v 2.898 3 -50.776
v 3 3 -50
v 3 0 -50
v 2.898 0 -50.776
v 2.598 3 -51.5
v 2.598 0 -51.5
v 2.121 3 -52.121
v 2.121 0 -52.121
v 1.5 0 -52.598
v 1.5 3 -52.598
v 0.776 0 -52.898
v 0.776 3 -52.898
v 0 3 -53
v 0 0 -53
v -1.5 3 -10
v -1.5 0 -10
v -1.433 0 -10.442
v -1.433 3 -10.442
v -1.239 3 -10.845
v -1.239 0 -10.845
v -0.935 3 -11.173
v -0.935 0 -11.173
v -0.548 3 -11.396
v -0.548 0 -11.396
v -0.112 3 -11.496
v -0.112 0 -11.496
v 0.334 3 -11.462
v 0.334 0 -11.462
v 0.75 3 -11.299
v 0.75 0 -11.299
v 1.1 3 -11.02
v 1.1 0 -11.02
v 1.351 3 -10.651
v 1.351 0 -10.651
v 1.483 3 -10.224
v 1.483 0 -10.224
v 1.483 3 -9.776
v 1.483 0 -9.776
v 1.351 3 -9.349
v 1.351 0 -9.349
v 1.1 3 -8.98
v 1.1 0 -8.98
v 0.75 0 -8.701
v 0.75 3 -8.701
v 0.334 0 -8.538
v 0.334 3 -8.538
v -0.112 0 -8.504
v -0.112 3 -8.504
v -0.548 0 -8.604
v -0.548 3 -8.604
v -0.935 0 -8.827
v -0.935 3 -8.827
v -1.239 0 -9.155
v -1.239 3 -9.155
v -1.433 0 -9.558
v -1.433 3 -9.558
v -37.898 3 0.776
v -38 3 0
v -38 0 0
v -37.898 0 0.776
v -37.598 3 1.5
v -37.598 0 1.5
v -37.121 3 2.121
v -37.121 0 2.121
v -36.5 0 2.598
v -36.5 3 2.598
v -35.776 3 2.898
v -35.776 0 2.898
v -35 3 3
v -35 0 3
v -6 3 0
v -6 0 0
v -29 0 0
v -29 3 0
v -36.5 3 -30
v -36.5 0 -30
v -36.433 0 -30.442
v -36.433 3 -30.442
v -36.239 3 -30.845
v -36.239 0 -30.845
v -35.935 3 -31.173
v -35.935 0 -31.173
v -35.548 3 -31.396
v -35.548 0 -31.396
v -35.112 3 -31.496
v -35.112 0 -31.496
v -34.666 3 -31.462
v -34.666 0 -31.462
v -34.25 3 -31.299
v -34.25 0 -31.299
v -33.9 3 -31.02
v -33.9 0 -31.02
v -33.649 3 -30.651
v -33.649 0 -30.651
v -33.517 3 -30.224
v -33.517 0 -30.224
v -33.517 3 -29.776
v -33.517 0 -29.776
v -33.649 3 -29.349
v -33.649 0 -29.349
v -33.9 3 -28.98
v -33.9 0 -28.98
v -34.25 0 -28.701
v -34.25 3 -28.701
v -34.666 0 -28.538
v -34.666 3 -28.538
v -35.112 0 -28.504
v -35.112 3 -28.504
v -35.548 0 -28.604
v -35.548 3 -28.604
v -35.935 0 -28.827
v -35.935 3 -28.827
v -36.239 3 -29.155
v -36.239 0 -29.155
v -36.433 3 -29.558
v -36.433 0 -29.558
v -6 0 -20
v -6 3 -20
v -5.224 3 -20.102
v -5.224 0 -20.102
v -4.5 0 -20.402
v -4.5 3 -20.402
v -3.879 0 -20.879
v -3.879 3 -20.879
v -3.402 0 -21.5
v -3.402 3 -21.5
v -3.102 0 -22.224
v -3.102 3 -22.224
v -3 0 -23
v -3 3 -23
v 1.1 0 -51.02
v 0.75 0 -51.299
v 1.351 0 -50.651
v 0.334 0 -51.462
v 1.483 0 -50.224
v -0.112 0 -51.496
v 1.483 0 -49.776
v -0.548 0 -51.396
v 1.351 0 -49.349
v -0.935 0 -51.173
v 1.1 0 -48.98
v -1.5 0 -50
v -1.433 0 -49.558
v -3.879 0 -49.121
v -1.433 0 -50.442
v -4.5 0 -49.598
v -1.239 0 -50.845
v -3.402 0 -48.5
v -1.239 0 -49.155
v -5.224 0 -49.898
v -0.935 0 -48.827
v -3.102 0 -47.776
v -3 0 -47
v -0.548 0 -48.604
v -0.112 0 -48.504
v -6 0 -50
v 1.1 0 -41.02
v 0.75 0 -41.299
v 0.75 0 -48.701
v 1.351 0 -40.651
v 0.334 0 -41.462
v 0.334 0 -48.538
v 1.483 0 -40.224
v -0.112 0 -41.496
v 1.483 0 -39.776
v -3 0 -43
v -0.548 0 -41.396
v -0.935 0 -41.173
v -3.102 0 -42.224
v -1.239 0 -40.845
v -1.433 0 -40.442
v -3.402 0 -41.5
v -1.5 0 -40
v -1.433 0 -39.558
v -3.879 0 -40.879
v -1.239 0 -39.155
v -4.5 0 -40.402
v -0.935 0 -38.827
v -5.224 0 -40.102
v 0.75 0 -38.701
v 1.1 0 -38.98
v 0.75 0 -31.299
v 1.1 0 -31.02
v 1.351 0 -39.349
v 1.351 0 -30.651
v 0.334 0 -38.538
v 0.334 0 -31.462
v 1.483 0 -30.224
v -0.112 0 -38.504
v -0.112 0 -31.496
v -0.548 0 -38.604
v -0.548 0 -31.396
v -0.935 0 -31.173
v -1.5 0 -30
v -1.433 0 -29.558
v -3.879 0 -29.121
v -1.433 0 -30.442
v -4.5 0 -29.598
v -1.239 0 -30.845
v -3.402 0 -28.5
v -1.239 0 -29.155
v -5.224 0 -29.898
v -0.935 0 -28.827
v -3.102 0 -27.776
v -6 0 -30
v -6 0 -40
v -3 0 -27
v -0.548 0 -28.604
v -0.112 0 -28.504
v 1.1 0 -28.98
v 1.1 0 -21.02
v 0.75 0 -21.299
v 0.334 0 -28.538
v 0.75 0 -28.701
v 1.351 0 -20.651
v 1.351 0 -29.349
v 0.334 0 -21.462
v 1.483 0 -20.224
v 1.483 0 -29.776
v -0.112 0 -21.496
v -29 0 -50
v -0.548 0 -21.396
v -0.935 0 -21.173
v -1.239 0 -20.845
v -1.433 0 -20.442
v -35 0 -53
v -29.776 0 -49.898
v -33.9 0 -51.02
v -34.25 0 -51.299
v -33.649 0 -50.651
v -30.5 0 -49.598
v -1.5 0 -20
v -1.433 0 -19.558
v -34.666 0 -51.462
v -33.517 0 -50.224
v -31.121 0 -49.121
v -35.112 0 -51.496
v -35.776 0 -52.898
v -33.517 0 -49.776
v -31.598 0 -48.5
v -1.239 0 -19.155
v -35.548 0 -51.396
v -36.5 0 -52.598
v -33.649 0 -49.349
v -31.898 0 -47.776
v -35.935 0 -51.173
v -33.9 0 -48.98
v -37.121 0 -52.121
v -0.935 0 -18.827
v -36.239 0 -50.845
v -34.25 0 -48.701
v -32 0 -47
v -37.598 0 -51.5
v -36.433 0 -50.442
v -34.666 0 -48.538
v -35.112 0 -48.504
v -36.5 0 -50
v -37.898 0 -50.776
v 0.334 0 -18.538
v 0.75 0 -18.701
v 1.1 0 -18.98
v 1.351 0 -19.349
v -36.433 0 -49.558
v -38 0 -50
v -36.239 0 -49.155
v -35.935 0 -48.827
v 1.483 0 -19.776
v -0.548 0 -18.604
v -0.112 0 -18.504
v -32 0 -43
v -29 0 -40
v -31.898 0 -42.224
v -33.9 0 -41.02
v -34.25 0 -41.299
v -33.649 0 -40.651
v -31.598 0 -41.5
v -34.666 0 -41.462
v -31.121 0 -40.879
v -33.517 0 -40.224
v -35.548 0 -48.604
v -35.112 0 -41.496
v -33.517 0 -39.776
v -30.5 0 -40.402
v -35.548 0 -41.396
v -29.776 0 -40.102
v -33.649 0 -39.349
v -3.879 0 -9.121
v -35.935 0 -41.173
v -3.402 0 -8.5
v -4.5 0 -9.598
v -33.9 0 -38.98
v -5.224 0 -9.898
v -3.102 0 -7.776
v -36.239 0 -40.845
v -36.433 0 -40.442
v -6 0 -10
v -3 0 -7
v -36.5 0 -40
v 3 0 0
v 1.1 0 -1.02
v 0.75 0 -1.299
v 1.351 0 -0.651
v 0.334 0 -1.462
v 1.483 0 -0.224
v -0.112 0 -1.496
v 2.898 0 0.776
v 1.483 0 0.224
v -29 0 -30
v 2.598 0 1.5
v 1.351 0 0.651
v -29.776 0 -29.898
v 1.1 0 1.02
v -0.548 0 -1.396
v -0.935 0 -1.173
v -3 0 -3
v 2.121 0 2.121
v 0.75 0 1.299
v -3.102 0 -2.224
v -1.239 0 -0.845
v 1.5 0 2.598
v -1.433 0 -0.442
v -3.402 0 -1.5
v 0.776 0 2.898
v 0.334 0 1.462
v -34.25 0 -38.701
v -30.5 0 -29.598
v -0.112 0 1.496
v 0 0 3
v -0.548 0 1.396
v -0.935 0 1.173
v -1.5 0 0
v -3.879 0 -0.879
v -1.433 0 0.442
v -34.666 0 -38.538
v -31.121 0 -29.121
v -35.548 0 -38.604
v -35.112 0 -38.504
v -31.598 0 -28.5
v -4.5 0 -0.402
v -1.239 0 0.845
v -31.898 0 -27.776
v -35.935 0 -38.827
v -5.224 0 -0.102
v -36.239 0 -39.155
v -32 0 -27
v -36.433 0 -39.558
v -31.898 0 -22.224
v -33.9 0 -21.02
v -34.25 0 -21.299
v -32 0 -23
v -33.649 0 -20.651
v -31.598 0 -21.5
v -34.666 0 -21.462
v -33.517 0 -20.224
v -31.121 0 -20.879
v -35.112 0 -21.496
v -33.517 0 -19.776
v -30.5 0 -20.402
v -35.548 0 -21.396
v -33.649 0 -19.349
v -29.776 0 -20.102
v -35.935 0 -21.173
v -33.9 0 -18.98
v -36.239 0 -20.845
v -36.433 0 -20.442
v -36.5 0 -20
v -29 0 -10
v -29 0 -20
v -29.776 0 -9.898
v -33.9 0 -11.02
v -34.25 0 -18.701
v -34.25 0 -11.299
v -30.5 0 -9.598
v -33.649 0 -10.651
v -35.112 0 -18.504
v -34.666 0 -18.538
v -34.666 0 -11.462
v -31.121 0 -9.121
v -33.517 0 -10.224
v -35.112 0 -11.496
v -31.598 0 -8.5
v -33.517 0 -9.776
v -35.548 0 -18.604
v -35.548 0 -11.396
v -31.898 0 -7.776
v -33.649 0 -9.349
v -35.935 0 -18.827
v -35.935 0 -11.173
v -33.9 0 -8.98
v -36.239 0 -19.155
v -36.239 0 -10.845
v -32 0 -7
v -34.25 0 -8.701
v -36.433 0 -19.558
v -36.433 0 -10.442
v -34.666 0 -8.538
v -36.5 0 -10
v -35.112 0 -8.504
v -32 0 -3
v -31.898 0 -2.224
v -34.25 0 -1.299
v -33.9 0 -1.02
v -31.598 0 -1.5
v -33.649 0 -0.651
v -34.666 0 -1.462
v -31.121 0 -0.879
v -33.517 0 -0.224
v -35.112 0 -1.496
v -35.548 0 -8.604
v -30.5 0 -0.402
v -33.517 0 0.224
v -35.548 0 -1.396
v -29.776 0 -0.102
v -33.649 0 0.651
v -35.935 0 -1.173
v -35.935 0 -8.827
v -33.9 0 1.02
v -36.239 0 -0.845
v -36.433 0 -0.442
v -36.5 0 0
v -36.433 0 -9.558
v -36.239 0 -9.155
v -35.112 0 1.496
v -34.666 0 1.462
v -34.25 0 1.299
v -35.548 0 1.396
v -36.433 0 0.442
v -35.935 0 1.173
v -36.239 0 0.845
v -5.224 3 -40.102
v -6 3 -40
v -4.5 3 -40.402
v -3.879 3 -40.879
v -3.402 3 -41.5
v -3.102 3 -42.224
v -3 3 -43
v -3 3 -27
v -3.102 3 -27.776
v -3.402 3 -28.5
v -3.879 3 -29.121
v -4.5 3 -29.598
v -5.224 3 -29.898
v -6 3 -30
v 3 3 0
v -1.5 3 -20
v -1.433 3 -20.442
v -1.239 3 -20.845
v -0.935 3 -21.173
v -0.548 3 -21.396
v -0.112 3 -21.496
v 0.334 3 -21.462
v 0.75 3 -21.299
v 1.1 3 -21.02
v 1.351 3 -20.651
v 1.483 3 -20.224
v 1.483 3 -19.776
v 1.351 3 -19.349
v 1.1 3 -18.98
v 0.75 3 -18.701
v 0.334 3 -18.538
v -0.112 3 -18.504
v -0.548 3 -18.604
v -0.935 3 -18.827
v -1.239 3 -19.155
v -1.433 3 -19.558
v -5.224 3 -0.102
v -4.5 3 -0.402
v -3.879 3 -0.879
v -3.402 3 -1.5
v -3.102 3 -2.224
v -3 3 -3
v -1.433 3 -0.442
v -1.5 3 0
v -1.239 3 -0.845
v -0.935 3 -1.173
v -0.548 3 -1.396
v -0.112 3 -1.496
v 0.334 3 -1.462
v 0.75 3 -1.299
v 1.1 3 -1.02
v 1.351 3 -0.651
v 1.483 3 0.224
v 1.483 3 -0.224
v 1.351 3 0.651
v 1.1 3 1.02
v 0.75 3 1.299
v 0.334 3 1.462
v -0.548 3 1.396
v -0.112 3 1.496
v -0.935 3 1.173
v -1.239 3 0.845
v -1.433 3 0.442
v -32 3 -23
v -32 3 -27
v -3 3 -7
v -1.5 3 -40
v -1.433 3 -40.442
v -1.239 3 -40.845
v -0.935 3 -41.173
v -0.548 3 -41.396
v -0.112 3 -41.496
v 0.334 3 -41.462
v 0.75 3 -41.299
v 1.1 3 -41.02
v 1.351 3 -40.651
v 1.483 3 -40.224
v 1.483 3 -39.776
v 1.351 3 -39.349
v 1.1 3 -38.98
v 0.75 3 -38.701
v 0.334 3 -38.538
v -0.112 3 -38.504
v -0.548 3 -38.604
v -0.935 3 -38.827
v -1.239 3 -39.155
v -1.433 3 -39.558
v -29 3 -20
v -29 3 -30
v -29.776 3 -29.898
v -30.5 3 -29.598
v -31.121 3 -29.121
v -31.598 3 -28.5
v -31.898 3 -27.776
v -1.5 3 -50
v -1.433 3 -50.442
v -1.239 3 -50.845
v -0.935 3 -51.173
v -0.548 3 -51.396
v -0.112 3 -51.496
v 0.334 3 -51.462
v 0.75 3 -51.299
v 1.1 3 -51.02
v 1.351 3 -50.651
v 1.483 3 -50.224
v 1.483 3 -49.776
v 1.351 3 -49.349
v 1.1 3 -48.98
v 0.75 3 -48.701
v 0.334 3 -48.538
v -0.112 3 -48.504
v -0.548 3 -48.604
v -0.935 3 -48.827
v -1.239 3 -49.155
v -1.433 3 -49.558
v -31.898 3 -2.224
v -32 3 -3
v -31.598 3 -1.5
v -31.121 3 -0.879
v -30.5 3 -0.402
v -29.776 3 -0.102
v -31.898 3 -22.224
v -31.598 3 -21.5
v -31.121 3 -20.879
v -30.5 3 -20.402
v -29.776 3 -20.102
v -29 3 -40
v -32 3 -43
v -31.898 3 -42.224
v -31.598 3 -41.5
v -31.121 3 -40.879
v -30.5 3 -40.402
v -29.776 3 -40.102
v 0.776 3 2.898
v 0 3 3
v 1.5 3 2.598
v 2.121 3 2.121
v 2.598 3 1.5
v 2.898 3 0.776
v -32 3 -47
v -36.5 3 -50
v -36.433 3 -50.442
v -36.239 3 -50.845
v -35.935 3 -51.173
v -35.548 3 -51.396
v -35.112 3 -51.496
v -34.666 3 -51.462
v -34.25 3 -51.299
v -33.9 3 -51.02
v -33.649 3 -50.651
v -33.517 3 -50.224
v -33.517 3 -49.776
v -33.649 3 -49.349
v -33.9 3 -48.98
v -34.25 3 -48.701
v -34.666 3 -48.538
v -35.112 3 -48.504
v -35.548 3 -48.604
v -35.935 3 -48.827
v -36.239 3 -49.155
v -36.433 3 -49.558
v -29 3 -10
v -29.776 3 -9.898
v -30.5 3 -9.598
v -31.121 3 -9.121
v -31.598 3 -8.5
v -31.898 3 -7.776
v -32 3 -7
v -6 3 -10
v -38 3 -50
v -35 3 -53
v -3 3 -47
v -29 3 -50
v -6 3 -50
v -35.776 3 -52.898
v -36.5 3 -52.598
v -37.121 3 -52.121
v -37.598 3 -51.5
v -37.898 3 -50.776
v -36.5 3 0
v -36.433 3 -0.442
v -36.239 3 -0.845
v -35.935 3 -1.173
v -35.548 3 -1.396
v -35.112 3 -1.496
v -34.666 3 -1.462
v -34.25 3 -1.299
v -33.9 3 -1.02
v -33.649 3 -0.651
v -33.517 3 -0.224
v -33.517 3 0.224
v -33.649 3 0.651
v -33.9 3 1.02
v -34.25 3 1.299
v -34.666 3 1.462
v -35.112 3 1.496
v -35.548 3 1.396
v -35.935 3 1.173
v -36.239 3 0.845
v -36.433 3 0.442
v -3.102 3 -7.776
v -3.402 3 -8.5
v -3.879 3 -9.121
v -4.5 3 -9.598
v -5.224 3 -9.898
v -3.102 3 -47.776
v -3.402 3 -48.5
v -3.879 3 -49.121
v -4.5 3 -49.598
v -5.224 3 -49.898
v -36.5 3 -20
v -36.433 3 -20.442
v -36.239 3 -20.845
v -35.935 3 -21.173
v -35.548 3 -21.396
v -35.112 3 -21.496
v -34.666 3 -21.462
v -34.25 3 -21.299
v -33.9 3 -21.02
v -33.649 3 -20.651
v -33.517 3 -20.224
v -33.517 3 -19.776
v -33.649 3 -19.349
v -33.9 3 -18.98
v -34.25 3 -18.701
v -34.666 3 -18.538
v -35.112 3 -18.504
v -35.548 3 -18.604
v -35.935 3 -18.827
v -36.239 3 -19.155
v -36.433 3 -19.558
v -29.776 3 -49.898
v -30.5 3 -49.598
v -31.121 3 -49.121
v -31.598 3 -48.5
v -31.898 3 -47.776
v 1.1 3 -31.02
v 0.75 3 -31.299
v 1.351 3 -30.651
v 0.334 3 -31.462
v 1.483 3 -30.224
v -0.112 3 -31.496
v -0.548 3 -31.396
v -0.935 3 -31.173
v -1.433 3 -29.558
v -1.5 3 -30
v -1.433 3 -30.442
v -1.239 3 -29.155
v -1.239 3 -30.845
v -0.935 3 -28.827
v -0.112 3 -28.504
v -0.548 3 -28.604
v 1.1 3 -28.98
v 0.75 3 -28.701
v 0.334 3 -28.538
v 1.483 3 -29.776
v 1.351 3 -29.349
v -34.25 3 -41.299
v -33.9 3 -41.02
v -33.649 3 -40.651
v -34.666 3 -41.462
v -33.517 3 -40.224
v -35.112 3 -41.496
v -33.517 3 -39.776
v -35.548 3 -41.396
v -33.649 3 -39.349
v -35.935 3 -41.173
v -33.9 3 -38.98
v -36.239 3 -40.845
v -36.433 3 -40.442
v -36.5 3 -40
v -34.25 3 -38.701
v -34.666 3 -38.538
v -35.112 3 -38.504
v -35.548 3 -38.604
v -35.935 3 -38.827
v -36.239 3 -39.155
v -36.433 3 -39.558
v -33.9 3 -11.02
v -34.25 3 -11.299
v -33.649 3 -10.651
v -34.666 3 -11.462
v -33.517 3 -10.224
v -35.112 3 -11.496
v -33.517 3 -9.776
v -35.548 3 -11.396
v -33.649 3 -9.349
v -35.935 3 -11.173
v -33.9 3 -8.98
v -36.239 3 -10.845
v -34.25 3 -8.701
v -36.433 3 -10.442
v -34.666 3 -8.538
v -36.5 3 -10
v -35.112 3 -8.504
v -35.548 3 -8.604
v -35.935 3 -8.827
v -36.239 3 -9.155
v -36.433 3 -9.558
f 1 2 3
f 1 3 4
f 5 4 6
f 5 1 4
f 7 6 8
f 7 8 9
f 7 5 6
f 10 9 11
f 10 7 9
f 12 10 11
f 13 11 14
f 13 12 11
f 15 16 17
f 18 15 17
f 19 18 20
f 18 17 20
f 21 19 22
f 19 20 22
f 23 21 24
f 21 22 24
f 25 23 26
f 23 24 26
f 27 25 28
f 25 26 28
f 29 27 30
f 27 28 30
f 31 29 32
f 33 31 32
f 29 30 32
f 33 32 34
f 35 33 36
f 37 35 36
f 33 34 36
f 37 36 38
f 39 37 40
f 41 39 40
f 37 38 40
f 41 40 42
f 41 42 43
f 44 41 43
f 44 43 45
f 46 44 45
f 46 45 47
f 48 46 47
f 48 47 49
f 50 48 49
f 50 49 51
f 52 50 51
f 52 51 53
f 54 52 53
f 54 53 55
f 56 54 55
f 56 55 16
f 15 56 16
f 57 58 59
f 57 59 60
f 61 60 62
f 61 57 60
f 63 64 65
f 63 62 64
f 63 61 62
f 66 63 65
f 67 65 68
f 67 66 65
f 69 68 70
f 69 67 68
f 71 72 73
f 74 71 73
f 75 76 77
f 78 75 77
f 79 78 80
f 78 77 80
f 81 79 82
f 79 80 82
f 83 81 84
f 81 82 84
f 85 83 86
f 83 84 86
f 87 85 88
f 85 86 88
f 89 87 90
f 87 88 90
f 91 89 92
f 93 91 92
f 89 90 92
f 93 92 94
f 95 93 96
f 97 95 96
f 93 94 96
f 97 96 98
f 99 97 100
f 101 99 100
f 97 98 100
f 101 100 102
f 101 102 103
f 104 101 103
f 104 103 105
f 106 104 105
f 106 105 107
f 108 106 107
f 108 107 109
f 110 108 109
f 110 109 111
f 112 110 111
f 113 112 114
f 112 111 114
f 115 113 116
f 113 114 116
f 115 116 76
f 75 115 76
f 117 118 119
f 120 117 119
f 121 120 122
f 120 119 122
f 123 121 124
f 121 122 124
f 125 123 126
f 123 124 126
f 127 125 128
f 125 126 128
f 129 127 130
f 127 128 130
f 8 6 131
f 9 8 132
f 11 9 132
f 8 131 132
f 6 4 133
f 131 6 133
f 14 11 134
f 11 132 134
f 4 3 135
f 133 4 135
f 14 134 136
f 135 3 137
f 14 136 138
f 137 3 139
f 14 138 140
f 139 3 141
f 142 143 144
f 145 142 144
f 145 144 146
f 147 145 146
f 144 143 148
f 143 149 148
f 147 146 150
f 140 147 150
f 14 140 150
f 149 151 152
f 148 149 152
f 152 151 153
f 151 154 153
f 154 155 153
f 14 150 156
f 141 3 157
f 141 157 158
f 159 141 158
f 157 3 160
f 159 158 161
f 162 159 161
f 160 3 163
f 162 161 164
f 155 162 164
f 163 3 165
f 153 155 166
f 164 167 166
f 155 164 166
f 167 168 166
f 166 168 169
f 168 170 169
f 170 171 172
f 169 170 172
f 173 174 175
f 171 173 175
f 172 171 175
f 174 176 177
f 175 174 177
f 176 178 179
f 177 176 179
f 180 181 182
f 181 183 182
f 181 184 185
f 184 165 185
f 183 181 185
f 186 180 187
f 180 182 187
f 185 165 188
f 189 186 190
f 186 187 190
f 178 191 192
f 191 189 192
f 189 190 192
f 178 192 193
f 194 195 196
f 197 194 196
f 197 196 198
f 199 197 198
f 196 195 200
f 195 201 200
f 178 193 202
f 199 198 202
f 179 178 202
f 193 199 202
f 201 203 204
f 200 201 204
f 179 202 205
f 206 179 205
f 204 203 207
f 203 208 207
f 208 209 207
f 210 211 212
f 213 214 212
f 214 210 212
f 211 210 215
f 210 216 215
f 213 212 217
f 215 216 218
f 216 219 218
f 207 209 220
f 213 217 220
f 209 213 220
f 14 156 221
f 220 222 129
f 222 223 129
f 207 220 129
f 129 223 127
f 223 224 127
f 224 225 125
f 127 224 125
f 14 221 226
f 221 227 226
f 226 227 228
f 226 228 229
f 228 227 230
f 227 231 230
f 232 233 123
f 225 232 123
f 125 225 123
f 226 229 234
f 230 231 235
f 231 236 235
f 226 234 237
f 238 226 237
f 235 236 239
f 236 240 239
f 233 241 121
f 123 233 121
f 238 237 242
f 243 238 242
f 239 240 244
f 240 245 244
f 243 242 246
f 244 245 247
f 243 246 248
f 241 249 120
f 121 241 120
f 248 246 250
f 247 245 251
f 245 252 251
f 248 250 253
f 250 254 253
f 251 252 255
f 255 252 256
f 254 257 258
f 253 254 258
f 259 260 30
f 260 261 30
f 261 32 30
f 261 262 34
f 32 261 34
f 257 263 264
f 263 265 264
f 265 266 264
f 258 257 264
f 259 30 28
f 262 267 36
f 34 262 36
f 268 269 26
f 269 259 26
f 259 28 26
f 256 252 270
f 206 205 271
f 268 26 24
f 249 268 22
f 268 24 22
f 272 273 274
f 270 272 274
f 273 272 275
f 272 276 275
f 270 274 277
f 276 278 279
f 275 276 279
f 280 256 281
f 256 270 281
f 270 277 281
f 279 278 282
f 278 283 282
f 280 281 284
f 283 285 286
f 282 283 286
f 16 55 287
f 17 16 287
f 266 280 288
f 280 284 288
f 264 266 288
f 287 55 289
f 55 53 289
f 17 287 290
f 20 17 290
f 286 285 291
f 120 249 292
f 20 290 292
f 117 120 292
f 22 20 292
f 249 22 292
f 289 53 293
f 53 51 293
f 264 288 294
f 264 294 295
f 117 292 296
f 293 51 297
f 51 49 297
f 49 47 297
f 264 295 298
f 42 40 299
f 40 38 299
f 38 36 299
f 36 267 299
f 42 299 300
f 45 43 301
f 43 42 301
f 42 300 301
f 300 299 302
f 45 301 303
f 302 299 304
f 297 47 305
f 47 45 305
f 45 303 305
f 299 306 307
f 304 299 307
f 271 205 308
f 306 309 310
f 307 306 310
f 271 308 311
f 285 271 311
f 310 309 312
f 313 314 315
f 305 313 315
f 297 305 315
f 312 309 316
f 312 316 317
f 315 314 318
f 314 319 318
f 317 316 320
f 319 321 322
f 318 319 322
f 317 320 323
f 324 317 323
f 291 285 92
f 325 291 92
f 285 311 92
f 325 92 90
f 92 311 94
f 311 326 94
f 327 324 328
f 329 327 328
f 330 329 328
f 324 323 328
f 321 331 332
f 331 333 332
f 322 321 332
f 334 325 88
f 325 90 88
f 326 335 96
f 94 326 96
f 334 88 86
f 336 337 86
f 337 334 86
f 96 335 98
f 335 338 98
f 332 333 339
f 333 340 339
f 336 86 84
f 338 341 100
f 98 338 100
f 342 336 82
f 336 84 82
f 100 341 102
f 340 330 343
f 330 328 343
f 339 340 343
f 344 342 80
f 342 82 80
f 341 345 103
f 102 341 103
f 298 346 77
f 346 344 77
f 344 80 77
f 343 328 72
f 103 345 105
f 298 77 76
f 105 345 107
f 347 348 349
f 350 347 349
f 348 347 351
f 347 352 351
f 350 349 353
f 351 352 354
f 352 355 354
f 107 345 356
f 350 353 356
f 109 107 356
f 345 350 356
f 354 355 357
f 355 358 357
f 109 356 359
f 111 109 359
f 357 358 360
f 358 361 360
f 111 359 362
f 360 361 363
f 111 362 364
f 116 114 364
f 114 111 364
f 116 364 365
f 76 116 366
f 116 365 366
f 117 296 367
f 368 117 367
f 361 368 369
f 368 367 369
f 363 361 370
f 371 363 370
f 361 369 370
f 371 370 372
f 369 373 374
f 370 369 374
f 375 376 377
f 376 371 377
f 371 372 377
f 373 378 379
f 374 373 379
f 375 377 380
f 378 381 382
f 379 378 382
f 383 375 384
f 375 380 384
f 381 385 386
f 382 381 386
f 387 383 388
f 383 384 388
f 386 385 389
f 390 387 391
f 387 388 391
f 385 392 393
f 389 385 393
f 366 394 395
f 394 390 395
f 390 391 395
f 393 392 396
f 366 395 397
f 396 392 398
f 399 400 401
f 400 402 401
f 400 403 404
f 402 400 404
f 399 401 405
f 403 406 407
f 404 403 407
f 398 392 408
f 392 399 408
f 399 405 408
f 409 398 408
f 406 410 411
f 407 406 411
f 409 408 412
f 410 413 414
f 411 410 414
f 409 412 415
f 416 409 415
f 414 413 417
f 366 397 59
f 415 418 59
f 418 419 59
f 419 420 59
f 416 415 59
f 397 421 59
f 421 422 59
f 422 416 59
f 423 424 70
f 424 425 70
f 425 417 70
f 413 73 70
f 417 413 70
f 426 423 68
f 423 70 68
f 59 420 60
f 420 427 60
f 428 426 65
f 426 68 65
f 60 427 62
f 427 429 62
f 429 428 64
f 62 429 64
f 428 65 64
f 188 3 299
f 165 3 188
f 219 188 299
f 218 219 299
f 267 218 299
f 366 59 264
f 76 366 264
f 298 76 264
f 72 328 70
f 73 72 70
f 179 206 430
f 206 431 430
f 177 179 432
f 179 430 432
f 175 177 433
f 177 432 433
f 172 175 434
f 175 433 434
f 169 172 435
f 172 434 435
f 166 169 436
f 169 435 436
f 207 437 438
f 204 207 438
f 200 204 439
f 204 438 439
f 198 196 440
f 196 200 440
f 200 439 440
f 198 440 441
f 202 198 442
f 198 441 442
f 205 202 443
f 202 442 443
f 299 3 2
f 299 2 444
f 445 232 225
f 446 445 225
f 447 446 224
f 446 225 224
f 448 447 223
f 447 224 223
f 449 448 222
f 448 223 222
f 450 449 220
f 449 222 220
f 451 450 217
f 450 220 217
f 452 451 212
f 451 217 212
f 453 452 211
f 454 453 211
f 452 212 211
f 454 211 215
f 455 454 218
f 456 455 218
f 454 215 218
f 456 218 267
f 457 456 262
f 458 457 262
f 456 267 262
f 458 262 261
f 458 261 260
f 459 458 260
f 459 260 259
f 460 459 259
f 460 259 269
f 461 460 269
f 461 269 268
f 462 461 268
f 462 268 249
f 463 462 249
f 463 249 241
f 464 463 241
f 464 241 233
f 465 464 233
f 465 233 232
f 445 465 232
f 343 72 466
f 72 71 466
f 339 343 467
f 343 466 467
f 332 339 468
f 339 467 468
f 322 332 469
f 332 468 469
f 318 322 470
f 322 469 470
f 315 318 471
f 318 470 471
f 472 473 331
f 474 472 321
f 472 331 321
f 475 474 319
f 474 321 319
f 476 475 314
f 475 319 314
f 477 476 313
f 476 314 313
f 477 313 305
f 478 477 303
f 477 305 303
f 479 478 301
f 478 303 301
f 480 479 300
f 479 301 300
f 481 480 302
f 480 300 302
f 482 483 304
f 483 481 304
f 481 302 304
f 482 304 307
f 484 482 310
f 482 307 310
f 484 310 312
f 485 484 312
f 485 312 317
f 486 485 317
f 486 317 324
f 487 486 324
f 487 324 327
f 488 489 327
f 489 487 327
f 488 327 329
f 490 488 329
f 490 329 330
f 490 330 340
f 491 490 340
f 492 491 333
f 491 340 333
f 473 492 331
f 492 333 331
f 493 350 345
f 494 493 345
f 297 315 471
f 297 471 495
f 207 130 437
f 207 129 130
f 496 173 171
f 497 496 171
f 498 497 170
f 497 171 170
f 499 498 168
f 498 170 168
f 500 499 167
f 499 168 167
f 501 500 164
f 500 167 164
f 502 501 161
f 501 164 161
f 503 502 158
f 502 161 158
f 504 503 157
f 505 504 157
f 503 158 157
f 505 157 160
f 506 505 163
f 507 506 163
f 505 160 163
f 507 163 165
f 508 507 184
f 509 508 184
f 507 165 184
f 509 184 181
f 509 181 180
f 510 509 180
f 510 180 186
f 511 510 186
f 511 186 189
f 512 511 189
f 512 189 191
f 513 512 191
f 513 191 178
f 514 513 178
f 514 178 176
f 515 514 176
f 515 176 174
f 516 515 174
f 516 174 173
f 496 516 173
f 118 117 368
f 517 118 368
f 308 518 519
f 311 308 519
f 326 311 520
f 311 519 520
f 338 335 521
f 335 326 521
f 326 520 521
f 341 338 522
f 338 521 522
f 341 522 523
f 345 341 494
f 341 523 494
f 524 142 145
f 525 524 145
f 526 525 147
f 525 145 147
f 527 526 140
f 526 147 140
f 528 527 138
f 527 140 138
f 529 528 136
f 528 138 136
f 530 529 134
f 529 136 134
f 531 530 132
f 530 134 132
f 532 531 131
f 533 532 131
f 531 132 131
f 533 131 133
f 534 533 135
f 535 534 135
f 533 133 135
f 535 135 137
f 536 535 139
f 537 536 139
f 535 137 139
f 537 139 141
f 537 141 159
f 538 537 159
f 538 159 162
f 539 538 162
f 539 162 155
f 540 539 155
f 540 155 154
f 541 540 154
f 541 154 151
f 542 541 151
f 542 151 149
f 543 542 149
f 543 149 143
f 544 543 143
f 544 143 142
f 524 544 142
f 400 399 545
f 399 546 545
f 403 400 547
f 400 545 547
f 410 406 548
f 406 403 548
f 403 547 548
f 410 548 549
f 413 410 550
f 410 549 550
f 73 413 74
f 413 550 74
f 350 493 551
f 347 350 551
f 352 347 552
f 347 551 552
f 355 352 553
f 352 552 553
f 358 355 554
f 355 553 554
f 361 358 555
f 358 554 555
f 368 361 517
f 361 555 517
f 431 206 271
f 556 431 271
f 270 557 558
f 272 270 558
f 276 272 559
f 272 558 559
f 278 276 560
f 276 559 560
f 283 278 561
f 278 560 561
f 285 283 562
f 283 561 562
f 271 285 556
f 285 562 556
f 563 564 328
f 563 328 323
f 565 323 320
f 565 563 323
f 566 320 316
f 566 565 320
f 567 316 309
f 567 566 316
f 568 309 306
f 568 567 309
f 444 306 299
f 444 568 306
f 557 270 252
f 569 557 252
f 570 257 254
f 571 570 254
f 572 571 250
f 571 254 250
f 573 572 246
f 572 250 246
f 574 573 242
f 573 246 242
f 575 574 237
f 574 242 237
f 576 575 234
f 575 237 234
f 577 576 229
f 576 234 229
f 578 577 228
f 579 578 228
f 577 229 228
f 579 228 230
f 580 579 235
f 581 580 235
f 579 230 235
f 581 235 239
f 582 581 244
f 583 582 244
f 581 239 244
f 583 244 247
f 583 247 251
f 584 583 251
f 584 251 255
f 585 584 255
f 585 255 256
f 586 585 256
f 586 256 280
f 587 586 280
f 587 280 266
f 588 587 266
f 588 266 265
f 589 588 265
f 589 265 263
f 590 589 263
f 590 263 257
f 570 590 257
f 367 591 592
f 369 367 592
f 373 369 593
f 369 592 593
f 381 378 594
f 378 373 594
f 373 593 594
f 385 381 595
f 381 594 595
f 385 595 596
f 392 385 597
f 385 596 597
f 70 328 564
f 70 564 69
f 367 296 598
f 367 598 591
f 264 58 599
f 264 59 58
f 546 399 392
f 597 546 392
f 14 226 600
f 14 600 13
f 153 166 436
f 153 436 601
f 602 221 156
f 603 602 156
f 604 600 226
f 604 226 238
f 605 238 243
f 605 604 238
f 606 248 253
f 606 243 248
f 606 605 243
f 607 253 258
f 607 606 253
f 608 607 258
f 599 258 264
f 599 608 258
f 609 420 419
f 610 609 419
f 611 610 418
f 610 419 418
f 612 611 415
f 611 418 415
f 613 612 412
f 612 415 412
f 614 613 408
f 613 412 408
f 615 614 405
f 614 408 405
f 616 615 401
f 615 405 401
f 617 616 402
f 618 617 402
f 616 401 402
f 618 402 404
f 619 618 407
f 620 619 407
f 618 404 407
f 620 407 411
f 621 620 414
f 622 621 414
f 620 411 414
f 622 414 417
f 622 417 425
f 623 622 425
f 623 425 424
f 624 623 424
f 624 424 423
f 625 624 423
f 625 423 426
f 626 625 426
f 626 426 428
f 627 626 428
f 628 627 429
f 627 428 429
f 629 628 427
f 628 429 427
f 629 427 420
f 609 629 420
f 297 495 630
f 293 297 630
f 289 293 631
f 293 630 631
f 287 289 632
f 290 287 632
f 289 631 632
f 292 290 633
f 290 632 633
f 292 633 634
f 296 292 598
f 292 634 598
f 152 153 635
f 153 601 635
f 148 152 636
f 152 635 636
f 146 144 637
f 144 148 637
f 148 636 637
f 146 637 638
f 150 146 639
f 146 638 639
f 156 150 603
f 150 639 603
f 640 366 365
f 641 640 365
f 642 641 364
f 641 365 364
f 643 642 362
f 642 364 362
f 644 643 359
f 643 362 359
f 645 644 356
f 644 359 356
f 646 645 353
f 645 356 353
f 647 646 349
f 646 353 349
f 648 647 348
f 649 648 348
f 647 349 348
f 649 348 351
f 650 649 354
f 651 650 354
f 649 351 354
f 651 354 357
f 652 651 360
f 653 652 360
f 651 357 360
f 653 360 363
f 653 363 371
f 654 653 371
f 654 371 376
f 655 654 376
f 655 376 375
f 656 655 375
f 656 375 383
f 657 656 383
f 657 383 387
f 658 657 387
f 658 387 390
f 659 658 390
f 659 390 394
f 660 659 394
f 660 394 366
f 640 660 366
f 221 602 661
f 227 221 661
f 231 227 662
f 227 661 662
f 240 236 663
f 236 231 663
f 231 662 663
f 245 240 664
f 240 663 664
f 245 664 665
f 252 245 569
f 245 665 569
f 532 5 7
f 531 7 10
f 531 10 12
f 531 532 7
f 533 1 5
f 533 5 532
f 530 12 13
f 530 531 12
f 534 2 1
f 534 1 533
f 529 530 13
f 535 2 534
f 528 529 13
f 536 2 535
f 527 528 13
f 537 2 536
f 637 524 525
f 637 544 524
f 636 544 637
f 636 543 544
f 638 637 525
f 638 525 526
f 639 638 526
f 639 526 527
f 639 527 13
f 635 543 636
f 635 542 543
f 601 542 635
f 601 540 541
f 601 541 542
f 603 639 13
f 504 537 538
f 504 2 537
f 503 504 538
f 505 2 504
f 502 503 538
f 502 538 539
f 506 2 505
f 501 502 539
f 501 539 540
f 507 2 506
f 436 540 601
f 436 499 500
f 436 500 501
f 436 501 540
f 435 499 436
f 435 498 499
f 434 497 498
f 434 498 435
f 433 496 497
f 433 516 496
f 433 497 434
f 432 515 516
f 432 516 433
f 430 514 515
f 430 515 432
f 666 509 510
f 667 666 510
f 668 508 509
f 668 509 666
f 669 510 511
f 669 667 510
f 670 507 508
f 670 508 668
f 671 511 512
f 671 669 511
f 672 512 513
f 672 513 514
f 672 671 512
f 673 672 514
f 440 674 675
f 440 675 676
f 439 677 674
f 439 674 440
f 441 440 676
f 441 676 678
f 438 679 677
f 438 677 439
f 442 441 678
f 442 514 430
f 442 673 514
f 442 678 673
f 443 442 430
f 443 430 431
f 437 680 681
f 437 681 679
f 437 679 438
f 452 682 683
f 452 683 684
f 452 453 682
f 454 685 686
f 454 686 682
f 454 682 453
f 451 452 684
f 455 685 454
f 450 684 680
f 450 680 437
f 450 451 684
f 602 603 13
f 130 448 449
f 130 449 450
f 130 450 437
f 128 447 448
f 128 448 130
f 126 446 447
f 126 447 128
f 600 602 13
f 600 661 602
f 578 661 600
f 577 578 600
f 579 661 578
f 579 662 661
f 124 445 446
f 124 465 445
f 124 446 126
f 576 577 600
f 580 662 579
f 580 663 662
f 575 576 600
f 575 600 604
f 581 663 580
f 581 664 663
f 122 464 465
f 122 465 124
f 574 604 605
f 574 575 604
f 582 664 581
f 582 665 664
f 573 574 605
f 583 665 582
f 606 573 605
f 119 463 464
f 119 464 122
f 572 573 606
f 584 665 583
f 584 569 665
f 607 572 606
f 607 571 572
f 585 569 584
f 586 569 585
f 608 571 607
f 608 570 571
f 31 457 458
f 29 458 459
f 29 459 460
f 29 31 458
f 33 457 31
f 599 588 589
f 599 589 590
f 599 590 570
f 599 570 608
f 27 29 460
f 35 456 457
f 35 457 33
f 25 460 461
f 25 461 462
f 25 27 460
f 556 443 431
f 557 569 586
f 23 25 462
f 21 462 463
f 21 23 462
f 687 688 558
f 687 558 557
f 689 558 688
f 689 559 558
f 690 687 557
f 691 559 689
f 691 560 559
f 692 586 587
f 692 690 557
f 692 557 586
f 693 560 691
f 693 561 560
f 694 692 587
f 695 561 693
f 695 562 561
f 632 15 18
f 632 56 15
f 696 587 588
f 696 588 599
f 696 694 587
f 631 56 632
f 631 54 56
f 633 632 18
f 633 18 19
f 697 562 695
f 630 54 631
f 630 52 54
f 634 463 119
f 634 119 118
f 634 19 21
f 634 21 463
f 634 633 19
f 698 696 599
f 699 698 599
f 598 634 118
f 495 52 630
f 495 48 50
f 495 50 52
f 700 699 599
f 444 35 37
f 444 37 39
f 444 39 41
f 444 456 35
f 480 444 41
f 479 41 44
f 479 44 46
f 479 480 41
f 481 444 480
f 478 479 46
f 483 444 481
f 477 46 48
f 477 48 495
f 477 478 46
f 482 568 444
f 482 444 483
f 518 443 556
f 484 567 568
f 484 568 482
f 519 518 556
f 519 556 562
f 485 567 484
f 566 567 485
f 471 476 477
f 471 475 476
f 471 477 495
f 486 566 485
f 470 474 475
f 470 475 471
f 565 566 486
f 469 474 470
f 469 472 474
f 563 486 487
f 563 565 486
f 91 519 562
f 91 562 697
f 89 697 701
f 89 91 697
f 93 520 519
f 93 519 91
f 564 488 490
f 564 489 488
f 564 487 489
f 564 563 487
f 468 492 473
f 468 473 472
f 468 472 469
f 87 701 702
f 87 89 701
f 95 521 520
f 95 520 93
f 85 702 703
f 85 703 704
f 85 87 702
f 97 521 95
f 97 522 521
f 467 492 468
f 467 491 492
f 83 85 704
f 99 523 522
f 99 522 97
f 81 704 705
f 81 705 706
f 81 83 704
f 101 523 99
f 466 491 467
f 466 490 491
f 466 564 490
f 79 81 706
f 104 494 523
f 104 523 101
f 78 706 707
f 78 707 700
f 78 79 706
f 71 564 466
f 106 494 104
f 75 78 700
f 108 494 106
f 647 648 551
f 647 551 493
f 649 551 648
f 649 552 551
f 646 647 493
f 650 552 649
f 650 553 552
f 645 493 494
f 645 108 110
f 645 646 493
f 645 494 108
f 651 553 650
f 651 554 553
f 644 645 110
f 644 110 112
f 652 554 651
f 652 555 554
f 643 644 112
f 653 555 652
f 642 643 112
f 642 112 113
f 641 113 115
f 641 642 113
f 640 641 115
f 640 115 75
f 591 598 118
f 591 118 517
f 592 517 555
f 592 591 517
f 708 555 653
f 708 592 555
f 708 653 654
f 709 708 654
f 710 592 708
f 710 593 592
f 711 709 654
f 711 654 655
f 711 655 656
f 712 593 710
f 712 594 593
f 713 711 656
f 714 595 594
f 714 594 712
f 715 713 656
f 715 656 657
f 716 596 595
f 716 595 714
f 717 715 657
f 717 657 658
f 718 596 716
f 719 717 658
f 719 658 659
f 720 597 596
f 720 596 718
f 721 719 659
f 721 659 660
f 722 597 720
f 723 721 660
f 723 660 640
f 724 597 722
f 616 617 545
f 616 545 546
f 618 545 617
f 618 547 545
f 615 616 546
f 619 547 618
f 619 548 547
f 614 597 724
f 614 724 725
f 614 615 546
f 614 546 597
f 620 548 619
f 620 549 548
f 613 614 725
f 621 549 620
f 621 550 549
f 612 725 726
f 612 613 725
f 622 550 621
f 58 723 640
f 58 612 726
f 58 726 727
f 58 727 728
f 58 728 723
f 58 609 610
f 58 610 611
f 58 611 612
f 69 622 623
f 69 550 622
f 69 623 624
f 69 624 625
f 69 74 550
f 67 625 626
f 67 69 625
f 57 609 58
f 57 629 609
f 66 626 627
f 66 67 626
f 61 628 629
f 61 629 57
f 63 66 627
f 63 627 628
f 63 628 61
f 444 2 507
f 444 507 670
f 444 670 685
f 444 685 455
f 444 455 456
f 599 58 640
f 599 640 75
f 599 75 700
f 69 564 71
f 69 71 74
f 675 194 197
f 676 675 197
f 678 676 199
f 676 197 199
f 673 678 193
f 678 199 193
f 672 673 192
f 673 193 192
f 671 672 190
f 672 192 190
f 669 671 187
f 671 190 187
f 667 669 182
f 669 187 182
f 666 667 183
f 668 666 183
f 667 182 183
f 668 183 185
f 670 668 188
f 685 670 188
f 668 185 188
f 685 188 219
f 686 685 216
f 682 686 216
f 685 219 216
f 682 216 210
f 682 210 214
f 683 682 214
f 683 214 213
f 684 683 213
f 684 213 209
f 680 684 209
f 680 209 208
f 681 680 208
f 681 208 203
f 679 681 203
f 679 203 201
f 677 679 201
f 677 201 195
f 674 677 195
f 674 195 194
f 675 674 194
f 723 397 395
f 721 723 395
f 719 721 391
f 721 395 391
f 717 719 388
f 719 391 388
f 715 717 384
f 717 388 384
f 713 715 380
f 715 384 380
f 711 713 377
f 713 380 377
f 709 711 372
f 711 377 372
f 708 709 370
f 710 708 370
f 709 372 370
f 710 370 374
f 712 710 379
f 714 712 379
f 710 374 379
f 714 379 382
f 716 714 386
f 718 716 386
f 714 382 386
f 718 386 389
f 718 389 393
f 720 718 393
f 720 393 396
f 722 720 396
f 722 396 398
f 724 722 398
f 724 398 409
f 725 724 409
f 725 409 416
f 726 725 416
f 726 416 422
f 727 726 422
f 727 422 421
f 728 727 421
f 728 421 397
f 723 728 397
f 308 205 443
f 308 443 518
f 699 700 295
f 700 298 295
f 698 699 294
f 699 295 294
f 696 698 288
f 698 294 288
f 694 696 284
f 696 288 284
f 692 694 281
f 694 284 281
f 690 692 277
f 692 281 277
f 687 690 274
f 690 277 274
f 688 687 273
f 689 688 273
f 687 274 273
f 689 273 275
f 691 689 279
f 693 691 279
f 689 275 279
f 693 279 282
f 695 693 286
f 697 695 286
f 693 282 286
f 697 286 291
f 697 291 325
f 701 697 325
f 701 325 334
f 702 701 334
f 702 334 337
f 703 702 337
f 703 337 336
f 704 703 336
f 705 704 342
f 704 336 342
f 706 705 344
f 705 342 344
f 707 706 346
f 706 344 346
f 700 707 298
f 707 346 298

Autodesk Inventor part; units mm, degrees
ref_plane "YZ Plane" through (0, 0, 0) normal (1, 0, 0) x (0, 1, 0)
ref_plane "XZ Plane" through (0, 0, 0) normal (0, 1, 0) x (-1, 0, 0)
ref_plane "XY Plane" through (0, 0, 0) normal (0, 0, 1) x (1, 0, 0)
sketch "Sketch1" plane through (0, 0, 0) normal (0, 1, 0) x (-1, 0, 0)
  line L0 (0, 0) -> (35, 0)
  line L1 (35, 0) -> (35, -50)
  line L2 (35, -50) -> (0, -50)
  line L3 (0, -50) -> (0, 0)
  line L4 (0, 0) -> (0, -10)
  line L5 (0, -10) -> (0, -20)
  line L6 (0, -20) -> (0, -30)
  line L7 (0, -30) -> (0, -40)
  line L8 (35, 0) -> (35, -10)
  line L9 (35, -10) -> (35, -20)
  line L10 (35, -20) -> (35, -30)
  line L11 (35, -30) -> (35, -40)
  circle A0 centre (35, 0) radius 1.5
  circle A1 centre (35, -10) radius 1.5
  circle A2 centre (35, -20) radius 1.5
  circle A3 centre (35, -30) radius 1.5
  circle A4 centre (35, -40) radius 1.5
  circle A5 centre (35, -50) radius 1.5
  circle A6 centre (0, -50) radius 1.5
  circle A7 centre (0, -40) radius 1.5
  circle A8 centre (0, -30) radius 1.5
  circle A9 centre (0, -20) radius 1.5
  circle A10 centre (0, -10) radius 1.5
  circle A11 centre (0, 0) radius 1.5
  line L12 (35, -50) -> (38, -50)
  line L13 (38, -50) -> (38, -53)
  line L14 (38, -53) -> (35, -53)
  line L15 (35, -53) -> (35, -50)
  line L16 (0, 0) -> (-3, 0)
  line L17 (-3, 0) -> (-3, 3)
  line L18 (-3, 3) -> (0, 3)
  line L19 (0, 3) -> (0, 0)
  line L20 (-3, 3) -> (38, 3)
  line L21 (38, 3) -> (38, -53)
  line L22 (38, -53) -> (-3, -53)
  line L23 (-3, -53) -> (-3, 3)
  line L24 (35, 0) -> (0, 0)
  line L25 (0, 0) -> (0, -10)
  line L26 (0, -10) -> (35, -10)
  line L27 (35, -10) -> (35, 0)
  line L28 (35, -10) -> (0, -10)
  line L29 (0, -10) -> (0, -20)
  line L30 (0, -20) -> (35, -20)
  line L31 (35, -20) -> (35, -10)
  line L32 (35, -20) -> (0, -20)
  line L33 (0, -20) -> (0, -30)
  line L34 (0, -30) -> (35, -30)
  line L35 (35, -30) -> (35, -20)
  line L36 (35, -30) -> (0, -30)
  line L37 (0, -30) -> (0, -40)
  line L38 (0, -40) -> (35, -40)
  line L39 (35, -40) -> (35, -30)
  line L40 (35, 0) -> (32, 0)
  line L41 (32, 0) -> (32, -50)
  line L42 (32, -50) -> (35, -50)
  line L43 (35, -50) -> (35, 0)
  line L44 (0, 0) -> (3, 0)
  line L45 (3, 0) -> (3, -50)
  line L46 (3, -50) -> (0, -50)
  line L47 (0, -50) -> (0, 0)
  point P0 (32, 0)
  point P1 (32, -10)
  point P2 (3, -10)
  point P3 (3, -40)
  point P4 (32, -40)
  point P5 (3, -20)
  point P6 (32, -20)
  point P7 (32, -30)
  point P8 (3, -30)
  dimension "d0" = 35
  dimension "d1" = 50
  dimension "d2" = 10
  dimension "d3" = 10
  dimension "d4" = 10
  dimension "d5" = 10
  dimension "d6" = 10
  dimension "d7" = 10
  dimension "d8" = 10
  dimension "d9" = 10
  dimension "d10" = 3
  dimension "d11" = 3
  dimension "d12" = 3
  dimension "d13" = 3
  dimension "d14" = 3
  dimension "d15" = 3
  dimension "d16" = 3
  dimension "d17" = 3
  dimension "d18" = 3
  dimension "d19" = 3
  dimension "d20" = 3
  dimension "d21" = 3
  dimension "d22" = 3
  dimension "d23" = 3
  dimension "d24" = 3
  dimension "d25" = 3
  dimension "d26" = 3
  dimension "d27" = 3
extrude "Extrusion1" add sketch "Sketch1" along normal blind 3 contours A11 L19 L20 L21 L12 A5 L1 A4 A3 A2 A1 A0 L0 | L0 L45 L26 A10 L3 A11 | L3 A10 A9 A8 A7 A6 L2 A5 L15 L22 L23 L16 A11 | L16 L17 L18 L19 A11 | L0 A0 L1 A1 L26 L41 | L45 L30 A9 L3 A10 L26 | L26 L41 L30 L45 | L26 A1 L1 A2 L30 L41 | L45 L34 A8 L3 A9 L30 | L15 A5 L12 L13 L14 | L30 A2 L1 A3 L34 L41 | L45 L38 A7 L3 A8 L34 | L34 L41 L38 L45 | L34 A3 L1 A4 L38 L41 | L45 L2 A6 L3 A7 L38 | L2 L41 L38 A4 L1 A5
fillet "Fillet1" radius 3 16 edges at (3, 1.5, 3) (-38, 1.5, 3) (-38, 1.5, -53) (3, 1.5, -53) (-32, 1.5, -50) (-32, 1.5, -40) (-3, 1.5, -40) (-3, 1.5, -50) (-3, 1.5, -30) (-3, 1.5, -20) (-32, 1.5, -20) (-32, 1.5, -30) (-32, 1.5, -10) (-32, 1.5, 0) (-3, 1.5, 0) (-3, 1.5, -10)
properties part number "base_extender"
